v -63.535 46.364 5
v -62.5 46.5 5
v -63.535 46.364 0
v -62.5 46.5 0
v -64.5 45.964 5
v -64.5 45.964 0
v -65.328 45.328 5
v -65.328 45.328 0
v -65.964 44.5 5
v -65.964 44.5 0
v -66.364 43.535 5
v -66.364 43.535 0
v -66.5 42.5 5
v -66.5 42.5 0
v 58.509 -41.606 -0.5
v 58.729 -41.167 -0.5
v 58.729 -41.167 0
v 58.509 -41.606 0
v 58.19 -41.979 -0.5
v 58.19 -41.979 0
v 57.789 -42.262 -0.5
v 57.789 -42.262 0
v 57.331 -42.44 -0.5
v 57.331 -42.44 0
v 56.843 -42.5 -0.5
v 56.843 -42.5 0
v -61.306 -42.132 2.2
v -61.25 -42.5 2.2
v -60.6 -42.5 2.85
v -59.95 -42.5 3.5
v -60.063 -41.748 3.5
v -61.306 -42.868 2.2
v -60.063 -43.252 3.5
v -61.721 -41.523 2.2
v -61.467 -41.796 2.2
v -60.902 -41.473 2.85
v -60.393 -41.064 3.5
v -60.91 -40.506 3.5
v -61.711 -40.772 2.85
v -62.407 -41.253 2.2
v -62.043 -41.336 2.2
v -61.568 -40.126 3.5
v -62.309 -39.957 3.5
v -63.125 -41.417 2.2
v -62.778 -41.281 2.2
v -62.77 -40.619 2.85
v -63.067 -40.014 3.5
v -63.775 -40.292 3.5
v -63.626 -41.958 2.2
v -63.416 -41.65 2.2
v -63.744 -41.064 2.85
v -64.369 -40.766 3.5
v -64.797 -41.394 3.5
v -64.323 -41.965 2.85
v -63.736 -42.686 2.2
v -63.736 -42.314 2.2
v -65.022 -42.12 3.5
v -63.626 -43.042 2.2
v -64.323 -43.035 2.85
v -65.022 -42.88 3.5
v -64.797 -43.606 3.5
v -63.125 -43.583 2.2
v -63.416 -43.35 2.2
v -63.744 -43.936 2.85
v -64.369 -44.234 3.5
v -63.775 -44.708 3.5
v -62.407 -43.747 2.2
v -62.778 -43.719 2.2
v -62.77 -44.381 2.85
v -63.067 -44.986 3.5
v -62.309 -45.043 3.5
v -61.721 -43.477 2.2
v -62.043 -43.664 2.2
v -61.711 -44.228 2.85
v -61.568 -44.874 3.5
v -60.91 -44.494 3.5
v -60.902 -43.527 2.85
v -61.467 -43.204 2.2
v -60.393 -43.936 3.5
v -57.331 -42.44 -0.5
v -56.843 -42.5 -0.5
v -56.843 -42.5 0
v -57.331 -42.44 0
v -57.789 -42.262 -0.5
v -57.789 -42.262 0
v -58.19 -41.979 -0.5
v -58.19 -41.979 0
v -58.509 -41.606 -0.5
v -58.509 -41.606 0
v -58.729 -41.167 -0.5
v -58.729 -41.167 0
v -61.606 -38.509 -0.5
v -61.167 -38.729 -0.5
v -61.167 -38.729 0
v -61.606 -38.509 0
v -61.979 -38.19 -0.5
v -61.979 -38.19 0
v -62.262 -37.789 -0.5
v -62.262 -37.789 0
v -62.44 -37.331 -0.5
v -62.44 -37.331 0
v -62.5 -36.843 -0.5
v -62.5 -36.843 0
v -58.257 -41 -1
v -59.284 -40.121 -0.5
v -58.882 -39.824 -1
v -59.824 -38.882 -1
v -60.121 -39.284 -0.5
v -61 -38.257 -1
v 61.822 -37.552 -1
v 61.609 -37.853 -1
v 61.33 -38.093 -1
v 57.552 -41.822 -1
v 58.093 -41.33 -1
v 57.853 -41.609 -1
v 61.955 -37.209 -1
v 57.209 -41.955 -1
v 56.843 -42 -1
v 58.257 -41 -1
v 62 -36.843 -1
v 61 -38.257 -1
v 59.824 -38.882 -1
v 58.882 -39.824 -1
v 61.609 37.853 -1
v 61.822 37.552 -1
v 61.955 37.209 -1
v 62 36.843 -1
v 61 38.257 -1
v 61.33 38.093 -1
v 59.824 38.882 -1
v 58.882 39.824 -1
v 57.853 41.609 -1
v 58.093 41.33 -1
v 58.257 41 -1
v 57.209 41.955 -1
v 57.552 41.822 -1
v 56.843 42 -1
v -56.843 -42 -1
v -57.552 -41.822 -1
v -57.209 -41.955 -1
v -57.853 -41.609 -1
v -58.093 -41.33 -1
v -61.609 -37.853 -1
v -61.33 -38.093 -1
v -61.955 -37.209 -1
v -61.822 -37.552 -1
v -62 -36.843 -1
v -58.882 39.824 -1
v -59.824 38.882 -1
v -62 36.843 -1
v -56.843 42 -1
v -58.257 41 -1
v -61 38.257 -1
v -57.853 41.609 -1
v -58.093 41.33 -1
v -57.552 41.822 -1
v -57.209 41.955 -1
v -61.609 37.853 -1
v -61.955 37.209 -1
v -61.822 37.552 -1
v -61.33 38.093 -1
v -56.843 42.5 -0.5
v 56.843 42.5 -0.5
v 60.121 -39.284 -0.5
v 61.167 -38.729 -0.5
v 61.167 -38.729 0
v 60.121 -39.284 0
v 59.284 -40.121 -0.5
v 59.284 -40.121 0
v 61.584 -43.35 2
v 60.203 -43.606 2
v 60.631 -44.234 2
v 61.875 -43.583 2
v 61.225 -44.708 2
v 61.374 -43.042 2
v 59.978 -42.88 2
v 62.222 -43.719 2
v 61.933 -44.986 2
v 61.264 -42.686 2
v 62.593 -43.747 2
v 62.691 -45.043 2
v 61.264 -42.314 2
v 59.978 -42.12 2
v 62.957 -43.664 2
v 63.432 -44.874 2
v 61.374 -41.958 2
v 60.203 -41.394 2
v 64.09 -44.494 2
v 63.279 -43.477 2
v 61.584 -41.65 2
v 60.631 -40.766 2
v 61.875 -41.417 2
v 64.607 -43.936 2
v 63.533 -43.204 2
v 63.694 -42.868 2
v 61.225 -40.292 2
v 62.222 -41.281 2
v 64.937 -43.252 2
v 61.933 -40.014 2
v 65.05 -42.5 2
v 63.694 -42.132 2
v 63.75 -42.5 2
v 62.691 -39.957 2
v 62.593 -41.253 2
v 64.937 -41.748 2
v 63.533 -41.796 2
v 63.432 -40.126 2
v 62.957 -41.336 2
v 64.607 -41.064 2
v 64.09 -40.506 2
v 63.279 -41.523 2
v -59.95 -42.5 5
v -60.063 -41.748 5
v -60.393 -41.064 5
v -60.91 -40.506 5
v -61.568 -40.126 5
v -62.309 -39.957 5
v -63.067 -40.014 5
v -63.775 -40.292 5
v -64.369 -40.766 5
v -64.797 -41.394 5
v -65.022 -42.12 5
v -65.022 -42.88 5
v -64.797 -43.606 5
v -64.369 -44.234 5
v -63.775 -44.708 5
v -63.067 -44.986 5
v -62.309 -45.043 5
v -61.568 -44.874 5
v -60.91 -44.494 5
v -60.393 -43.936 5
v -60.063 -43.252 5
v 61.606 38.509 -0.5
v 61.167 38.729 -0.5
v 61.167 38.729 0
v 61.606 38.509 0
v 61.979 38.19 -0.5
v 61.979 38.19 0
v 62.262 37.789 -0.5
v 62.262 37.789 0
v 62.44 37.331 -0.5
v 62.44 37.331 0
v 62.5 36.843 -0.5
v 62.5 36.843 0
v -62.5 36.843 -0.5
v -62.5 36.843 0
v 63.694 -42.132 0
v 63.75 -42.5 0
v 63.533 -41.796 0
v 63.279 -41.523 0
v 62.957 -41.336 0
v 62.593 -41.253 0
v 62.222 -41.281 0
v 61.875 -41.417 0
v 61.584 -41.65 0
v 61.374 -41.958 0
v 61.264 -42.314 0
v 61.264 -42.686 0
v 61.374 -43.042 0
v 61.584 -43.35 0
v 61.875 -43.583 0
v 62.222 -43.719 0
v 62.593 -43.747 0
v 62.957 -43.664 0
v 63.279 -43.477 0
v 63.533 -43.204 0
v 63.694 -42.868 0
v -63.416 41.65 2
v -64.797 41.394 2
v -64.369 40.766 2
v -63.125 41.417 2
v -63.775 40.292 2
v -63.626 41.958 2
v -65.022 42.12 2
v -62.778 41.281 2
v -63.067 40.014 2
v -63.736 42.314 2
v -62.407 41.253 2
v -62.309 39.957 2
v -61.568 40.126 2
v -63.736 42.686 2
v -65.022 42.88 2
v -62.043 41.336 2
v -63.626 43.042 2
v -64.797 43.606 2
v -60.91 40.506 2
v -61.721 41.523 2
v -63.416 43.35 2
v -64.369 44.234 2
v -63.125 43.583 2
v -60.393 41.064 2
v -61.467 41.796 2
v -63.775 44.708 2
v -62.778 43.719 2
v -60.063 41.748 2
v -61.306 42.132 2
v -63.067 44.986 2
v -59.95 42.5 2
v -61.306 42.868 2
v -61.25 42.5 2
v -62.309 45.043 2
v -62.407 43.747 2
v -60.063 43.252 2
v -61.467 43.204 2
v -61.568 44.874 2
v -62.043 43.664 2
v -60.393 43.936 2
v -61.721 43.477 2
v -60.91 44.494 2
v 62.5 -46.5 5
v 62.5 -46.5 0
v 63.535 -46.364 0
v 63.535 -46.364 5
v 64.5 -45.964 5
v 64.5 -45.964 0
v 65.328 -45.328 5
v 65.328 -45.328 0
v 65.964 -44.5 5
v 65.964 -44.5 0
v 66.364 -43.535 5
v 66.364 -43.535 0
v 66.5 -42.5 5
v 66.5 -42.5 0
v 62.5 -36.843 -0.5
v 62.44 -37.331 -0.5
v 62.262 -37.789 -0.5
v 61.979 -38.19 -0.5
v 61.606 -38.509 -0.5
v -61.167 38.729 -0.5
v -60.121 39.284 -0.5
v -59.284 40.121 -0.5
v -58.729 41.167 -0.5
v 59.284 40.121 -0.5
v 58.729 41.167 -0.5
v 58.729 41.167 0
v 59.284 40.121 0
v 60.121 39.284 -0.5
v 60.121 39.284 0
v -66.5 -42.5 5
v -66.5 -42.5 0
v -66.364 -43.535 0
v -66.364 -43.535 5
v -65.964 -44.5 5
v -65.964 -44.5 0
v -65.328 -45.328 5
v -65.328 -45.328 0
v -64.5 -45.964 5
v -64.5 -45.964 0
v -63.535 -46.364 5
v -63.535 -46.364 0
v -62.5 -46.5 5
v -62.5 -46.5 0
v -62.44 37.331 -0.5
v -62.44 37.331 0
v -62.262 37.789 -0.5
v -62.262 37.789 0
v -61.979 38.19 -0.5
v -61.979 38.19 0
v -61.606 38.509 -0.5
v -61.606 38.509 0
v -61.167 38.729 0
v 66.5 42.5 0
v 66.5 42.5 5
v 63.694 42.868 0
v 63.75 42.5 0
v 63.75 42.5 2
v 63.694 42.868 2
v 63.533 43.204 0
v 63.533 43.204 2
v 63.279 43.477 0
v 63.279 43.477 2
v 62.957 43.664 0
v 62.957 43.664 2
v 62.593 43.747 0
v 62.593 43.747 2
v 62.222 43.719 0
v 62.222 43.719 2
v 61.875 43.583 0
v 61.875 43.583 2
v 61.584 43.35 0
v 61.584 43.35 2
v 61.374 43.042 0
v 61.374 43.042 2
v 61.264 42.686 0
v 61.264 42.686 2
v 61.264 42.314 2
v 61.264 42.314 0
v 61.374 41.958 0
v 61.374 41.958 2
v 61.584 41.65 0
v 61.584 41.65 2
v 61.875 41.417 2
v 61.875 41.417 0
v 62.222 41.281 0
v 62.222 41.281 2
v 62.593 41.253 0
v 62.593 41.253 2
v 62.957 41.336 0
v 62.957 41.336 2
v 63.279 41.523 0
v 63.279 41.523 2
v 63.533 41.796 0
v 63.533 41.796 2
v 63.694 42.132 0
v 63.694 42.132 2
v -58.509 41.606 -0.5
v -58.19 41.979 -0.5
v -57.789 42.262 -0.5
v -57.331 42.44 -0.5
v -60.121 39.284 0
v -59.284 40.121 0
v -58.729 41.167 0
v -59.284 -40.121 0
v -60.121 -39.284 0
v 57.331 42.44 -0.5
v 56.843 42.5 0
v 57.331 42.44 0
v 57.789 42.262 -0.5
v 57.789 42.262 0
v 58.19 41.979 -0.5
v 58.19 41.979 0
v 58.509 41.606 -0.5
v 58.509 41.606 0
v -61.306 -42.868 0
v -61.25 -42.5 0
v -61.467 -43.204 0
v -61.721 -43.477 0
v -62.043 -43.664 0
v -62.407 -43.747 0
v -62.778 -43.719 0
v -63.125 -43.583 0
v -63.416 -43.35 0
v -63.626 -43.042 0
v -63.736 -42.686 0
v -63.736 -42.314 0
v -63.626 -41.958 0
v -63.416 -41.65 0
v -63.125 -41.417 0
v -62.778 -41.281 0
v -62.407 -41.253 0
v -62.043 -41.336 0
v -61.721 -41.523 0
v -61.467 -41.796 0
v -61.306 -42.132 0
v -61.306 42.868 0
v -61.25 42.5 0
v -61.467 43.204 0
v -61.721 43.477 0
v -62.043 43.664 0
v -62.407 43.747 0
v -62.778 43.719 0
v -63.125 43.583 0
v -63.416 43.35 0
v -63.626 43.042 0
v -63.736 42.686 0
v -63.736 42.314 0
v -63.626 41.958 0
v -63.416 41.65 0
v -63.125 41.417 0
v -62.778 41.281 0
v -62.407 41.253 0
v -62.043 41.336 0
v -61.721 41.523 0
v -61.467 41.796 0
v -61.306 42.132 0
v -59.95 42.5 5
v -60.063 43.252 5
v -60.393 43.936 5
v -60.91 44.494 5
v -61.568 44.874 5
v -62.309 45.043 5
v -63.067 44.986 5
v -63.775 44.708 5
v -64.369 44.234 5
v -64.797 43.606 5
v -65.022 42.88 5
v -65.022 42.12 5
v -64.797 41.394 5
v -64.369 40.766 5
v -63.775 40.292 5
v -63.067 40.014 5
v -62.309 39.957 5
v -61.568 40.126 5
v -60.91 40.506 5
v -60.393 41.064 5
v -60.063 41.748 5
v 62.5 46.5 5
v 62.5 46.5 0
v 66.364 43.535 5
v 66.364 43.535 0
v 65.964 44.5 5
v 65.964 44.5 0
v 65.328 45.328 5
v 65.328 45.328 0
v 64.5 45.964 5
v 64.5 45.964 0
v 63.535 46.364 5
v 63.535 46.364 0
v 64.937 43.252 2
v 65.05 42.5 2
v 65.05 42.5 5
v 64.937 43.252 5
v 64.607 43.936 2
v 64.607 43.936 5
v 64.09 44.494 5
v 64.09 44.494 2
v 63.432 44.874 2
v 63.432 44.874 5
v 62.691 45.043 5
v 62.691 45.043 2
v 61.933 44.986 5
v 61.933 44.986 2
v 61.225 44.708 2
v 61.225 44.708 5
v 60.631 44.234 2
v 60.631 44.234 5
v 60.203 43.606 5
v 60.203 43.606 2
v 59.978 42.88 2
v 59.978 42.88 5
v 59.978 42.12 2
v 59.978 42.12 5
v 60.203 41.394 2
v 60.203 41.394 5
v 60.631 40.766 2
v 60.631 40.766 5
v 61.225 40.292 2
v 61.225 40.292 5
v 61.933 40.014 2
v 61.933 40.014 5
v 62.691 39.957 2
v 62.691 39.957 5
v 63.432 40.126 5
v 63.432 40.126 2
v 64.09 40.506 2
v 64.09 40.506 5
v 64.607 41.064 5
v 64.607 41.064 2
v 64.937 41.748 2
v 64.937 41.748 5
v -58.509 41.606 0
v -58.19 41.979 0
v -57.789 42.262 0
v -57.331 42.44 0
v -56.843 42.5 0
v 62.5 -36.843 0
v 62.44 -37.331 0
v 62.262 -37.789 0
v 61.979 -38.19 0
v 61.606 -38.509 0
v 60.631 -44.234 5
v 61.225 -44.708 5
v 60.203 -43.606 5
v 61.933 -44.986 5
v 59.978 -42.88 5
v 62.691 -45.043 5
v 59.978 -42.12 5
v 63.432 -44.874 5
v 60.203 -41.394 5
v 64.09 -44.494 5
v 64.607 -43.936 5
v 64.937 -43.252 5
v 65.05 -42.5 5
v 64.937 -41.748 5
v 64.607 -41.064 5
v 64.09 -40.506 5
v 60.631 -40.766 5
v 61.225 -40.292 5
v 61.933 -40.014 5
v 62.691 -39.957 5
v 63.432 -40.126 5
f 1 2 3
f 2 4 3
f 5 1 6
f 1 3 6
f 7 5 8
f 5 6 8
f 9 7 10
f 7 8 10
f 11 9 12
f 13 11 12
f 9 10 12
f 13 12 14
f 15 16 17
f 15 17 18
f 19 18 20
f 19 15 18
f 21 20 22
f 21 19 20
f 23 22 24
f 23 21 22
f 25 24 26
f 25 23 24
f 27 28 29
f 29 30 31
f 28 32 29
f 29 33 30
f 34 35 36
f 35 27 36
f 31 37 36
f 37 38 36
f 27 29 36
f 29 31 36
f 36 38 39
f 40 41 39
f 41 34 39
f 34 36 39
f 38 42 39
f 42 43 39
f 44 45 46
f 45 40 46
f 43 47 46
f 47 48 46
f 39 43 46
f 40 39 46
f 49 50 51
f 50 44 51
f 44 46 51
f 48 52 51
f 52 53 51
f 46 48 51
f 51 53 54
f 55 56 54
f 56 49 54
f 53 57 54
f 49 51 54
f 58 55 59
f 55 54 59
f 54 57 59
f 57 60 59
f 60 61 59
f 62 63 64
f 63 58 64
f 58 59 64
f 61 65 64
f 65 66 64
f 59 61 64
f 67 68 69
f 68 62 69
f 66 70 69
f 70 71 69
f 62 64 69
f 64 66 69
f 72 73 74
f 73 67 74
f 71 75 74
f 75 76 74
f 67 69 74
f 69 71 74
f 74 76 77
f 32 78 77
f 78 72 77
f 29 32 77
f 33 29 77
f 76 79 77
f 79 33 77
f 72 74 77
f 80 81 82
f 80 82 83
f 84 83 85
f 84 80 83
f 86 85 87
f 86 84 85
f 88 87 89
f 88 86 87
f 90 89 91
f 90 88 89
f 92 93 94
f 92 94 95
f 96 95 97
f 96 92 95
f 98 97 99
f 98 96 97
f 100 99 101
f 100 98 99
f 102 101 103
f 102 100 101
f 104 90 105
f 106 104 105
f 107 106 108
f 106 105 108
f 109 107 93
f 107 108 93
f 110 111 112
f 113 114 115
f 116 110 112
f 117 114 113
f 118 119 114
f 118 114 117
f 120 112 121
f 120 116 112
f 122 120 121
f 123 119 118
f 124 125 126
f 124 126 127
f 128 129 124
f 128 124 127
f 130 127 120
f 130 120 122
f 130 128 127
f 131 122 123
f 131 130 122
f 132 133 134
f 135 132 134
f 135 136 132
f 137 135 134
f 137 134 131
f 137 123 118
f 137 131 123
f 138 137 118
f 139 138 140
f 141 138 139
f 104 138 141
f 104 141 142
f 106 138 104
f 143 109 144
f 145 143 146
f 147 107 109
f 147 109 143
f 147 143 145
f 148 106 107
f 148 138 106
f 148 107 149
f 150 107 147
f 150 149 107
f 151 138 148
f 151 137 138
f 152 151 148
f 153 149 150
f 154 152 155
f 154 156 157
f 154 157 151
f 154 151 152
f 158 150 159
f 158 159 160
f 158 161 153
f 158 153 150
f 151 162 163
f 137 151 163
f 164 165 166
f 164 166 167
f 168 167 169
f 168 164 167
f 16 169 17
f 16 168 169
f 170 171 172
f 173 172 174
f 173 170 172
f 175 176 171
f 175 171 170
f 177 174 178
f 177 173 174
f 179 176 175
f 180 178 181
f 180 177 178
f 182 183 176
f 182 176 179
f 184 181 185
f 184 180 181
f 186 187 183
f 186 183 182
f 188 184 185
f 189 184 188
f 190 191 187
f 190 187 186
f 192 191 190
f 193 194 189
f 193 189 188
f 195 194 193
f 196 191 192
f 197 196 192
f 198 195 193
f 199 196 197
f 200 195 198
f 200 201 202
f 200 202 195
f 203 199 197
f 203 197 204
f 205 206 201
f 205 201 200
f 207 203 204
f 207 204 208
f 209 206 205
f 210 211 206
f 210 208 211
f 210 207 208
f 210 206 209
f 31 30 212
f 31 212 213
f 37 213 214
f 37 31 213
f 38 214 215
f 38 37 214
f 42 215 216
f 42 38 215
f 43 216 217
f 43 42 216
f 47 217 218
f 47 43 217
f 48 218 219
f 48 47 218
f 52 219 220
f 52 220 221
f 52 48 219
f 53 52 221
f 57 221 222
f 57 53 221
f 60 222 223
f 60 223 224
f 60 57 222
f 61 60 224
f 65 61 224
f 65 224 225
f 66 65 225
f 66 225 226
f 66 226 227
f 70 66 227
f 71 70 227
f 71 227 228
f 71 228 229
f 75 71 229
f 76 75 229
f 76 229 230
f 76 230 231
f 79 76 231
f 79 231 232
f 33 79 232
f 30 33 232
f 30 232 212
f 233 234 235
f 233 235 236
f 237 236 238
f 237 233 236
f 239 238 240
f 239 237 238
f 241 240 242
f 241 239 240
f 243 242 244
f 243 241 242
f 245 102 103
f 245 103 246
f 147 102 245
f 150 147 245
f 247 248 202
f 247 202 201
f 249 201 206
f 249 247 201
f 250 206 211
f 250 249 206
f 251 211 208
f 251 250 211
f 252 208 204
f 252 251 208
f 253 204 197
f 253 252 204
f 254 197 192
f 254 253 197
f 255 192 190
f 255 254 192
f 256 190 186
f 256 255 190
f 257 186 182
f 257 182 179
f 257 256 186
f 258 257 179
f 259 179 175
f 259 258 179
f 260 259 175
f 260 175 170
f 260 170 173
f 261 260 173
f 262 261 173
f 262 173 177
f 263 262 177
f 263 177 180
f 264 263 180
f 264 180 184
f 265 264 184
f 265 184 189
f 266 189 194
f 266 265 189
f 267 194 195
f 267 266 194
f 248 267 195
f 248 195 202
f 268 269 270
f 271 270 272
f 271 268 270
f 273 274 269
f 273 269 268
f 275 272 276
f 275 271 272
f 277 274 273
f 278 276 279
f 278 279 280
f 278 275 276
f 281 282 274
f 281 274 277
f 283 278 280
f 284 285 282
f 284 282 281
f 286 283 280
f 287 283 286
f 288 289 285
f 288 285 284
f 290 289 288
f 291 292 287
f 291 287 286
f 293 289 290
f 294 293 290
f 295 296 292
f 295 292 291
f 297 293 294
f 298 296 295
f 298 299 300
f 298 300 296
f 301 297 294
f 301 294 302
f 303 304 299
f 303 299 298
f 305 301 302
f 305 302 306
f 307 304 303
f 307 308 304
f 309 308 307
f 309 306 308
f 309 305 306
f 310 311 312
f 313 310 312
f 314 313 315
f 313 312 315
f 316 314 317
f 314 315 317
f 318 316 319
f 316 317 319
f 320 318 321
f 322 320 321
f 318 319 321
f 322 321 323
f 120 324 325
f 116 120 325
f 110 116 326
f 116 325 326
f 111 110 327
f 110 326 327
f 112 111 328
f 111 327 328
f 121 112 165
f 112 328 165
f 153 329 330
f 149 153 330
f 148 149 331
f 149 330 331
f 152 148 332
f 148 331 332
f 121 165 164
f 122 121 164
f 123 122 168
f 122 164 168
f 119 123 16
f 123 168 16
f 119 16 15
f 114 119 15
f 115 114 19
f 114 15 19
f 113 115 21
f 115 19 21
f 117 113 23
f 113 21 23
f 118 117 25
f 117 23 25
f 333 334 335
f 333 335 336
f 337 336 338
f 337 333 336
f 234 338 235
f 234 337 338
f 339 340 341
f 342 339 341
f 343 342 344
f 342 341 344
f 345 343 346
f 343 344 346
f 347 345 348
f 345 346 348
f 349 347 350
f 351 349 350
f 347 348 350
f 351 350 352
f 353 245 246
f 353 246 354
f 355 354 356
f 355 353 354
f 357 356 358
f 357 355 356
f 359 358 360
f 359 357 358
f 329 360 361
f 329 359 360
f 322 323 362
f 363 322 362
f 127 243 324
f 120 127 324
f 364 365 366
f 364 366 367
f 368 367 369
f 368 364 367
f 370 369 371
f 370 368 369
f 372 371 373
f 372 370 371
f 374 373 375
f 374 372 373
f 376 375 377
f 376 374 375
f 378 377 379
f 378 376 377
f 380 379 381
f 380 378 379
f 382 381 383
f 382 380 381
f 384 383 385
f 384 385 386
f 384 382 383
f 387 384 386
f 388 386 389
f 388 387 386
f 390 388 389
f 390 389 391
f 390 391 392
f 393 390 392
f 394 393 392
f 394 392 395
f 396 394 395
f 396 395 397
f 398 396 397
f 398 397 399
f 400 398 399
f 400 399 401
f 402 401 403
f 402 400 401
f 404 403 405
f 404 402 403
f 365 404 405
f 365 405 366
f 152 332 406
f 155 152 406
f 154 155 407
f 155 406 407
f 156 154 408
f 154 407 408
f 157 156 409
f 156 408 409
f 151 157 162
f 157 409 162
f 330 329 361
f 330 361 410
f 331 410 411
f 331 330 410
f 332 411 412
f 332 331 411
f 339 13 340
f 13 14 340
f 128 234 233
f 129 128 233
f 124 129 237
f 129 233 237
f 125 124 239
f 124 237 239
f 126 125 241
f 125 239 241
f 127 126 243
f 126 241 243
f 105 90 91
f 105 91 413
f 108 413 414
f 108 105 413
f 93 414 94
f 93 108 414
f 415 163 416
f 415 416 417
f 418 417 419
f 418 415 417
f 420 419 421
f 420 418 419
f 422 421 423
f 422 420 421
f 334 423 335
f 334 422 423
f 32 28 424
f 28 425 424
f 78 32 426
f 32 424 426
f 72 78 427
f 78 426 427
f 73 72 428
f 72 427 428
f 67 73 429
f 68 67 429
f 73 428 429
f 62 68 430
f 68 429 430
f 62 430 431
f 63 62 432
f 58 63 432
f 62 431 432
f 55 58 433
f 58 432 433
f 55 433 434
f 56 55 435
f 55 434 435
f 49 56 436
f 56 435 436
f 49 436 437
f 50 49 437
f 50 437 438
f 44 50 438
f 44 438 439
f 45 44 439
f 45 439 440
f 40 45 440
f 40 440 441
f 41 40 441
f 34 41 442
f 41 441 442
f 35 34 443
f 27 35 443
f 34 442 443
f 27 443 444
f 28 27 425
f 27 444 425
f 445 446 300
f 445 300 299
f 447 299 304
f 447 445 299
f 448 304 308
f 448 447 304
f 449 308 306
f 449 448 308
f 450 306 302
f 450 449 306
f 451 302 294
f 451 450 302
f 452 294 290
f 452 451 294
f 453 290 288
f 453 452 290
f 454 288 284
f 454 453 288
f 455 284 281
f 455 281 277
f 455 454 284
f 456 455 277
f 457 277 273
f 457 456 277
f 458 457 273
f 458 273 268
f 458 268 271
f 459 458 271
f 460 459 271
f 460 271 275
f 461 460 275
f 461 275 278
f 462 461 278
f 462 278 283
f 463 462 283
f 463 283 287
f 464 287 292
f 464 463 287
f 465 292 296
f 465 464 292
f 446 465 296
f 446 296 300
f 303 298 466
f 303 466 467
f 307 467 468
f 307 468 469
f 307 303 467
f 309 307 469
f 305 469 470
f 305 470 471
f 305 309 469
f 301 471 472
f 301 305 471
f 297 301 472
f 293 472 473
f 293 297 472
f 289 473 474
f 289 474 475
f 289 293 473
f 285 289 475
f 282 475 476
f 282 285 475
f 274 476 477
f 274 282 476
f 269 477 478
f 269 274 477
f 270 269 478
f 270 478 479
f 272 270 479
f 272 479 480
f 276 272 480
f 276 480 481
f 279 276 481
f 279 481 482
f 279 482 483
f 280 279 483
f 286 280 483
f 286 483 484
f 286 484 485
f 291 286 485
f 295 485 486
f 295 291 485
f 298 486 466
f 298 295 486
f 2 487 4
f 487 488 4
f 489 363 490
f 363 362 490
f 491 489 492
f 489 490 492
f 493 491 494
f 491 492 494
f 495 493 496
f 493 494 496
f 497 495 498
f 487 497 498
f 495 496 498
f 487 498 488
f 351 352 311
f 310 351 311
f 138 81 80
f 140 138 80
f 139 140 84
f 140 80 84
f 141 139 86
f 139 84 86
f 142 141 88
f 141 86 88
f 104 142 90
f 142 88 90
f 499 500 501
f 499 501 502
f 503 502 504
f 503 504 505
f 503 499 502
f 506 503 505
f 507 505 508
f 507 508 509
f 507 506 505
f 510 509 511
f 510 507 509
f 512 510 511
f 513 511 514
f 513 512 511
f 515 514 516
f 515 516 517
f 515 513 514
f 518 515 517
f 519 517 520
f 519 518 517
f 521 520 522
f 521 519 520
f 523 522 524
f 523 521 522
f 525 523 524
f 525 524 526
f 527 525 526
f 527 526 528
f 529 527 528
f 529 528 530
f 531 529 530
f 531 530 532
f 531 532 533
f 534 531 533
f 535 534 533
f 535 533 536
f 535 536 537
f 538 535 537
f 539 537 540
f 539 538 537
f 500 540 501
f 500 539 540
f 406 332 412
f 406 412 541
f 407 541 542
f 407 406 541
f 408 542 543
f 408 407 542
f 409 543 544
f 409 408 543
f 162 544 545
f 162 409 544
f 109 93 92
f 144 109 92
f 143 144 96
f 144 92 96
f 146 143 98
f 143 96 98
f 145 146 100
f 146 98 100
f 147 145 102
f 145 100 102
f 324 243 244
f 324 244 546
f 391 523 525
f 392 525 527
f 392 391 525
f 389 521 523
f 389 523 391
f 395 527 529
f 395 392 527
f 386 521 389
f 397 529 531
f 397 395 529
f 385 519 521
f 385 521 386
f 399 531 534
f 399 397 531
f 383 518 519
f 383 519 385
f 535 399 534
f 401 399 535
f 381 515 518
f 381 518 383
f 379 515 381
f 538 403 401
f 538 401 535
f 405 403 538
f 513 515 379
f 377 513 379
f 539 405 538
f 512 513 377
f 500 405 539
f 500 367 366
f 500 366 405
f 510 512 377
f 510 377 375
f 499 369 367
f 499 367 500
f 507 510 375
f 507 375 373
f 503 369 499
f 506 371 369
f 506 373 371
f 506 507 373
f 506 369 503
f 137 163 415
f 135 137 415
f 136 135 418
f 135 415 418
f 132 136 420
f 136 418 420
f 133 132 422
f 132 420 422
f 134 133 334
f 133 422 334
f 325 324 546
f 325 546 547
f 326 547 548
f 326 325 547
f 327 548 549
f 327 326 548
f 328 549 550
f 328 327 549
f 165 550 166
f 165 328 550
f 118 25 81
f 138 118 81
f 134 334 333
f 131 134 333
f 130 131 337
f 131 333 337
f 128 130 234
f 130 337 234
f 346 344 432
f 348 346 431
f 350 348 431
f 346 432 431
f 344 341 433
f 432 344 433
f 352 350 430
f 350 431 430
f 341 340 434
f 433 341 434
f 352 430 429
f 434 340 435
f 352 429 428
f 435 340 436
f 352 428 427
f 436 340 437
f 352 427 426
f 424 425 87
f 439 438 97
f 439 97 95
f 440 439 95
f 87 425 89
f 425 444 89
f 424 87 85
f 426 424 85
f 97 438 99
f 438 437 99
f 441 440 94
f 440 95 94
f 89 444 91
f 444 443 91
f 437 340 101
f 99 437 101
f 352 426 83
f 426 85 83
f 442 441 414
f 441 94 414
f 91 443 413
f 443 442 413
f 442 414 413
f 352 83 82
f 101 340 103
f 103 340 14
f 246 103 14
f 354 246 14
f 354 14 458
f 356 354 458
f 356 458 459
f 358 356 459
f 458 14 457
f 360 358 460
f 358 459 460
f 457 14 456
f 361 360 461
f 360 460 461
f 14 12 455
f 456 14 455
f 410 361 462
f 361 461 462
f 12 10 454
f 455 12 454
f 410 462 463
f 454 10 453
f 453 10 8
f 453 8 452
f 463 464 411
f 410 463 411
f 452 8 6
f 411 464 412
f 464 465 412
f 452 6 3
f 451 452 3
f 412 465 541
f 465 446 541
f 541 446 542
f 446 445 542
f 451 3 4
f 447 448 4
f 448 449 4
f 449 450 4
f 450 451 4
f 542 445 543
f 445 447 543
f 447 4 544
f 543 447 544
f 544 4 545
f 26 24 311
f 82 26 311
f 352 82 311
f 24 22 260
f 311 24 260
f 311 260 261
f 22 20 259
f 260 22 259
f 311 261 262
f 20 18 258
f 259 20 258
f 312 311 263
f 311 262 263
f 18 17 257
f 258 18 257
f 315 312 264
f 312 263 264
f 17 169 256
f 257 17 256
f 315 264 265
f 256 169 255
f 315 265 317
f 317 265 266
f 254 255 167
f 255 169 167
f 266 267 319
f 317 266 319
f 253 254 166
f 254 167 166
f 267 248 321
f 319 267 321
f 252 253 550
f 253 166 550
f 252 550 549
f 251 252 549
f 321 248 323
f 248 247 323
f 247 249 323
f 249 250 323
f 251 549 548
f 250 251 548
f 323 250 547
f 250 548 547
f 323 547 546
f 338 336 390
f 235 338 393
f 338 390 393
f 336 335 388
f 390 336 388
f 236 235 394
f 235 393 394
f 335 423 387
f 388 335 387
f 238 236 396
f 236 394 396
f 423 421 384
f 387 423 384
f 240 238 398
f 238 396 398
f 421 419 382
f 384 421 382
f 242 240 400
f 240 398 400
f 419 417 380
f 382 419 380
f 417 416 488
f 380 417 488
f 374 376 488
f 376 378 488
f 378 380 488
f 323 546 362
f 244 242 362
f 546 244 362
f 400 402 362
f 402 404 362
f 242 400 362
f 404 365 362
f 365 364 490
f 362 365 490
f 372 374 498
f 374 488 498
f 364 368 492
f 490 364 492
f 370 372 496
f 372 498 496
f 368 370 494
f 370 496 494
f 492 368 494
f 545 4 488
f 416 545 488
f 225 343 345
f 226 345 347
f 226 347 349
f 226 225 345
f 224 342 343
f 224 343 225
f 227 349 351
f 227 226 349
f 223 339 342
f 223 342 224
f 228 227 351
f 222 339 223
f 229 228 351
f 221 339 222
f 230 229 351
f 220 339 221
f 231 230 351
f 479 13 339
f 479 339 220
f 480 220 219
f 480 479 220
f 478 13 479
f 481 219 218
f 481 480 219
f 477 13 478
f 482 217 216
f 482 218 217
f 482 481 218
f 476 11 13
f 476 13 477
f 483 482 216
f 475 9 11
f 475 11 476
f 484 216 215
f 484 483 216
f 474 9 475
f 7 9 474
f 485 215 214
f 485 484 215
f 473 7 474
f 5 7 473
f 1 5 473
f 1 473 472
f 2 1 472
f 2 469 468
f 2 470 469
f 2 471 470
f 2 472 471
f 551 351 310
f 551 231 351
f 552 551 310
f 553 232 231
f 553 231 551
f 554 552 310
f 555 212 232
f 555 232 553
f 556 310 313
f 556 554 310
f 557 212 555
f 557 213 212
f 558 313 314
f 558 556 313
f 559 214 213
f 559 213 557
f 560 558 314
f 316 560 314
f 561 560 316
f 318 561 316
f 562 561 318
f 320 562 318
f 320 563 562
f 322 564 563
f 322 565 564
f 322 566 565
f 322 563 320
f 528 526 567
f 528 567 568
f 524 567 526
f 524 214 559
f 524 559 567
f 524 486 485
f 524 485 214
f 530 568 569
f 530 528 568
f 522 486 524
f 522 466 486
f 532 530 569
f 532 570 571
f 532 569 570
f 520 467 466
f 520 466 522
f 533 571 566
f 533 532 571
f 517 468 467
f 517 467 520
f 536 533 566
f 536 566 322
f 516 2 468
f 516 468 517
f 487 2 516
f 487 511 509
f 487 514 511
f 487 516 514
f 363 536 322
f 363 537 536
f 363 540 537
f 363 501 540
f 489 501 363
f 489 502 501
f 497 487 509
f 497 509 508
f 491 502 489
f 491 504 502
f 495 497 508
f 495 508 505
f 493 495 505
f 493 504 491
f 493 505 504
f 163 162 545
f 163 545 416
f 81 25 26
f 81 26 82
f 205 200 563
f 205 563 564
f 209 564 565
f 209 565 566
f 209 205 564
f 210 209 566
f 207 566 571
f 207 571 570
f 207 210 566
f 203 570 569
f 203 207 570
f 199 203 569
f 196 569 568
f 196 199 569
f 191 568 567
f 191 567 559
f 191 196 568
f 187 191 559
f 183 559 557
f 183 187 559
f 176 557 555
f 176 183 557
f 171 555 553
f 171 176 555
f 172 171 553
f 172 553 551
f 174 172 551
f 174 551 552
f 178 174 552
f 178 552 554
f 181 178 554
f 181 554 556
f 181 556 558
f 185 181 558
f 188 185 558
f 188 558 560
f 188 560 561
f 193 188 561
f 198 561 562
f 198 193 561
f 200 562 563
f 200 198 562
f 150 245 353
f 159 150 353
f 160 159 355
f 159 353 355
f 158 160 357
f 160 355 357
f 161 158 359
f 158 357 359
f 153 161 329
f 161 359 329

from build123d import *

# Parameters (mm, degrees)
SKETCH2_R           = 1.25
BOSS_EXTRUDE1_DEPTH = 2
SKETCH3_R           = 2.55
BOSS_EXTRUDE2_DEPTH = 3
BOSS_EXTRUDE3_START = 3
BOSS_EXTRUDE3_DEPTH = 3
CHAMFER1_SIZE       = 0.5
CHAMFER2_SIZE       = 1.5


with BuildPart() as part:
    # Sketch2 → Boss-Extrude1 (new body)
    with BuildSketch(Plane.XY):
        with BuildLine():
            Line((66.5, -42.5), (66.5, 42.5))
            ThreePointArc((66.5, 42.5), (65.328427125, 45.328427125), (62.5, 46.5))
            Line((62.5, 46.5), (-62.5, 46.5))
            ThreePointArc((-62.5, 46.5), (-65.328427125, 45.328427125), (-66.5, 42.5))
            Line((-66.5, 42.5), (-66.5, -42.5))
            ThreePointArc((-66.5, -42.5), (-65.328427125, -45.328427125), (-62.5, -46.5))
            Line((-62.5, -46.5), (62.5, -46.5))
            ThreePointArc((62.5, -46.5), (65.328427125, -45.328427125), (66.5, -42.5))
        make_face()
        with Locations((-62.5, 42.5)):
            Circle(SKETCH2_R, mode=Mode.SUBTRACT)
        with Locations((62.5, 42.5)):
            Circle(SKETCH2_R, mode=Mode.SUBTRACT)
        with Locations((-62.5, -42.5)):
            Circle(SKETCH2_R, mode=Mode.SUBTRACT)
        with Locations((62.5, -42.5)):
            Circle(SKETCH2_R, mode=Mode.SUBTRACT)
        with BuildLine():
            Line((-62.5, -36.843145751), (-62.5, 36.843145751))
            ThreePointArc((-62.5, 36.843145751), (-62.132993162, 37.997846289), (-61.166666667, 38.728763834))
            ThreePointArc((-61.166666667, 38.728763834), (-59.671572875, 39.671572875), (-58.728763834, 41.166666667))
            ThreePointArc((-58.728763834, 41.166666667), (-57.997846289, 42.132993162), (-56.843145751, 42.5))
            Line((-56.843145751, 42.5), (56.843145751, 42.5))
            ThreePointArc((56.843145751, 42.5), (57.997846289, 42.132993162), (58.728763834, 41.166666667))
            ThreePointArc((58.728763834, 41.166666667), (59.671572875, 39.671572875), (61.166666667, 38.728763834))
            ThreePointArc((61.166666667, 38.728763834), (62.132993162, 37.997846289), (62.5, 36.843145751))
            Line((62.5, 36.843145751), (62.5, -36.843145751))
            ThreePointArc((62.5, -36.843145751), (62.132993162, -37.997846289), (61.166666667, -38.728763834))
            ThreePointArc((61.166666667, -38.728763834), (59.671572875, -39.671572875), (58.728763834, -41.166666667))
            ThreePointArc((58.728763834, -41.166666667), (57.997846289, -42.132993162), (56.843145751, -42.5))
            Line((56.843145751, -42.5), (-56.843145751, -42.5))
            ThreePointArc((-56.843145751, -42.5), (-57.997846289, -42.132993162), (-58.728763834, -41.166666667))
            ThreePointArc((-58.728763834, -41.166666667), (-59.671572875, -39.671572875), (-61.166666667, -38.728763834))
            ThreePointArc((-61.166666667, -38.728763834), (-62.132993162, -37.997846289), (-62.5, -36.843145751))
        make_face(mode=Mode.SUBTRACT)
    extrude(amount=BOSS_EXTRUDE1_DEPTH)

    # Sketch3 → Boss-Extrude2 (add)
    with BuildSketch(Plane.XY.offset(2)):
        with BuildLine():
            Line((66.5, -42.5), (66.5, 42.5))
            ThreePointArc((66.5, 42.5), (65.328427125, 45.328427125), (62.5, 46.5))
            Line((62.5, 46.5), (-62.5, 46.5))
            ThreePointArc((-62.5, 46.5), (-65.328427125, 45.328427125), (-66.5, 42.5))
            Line((-66.5, 42.5), (-66.5, -42.5))
            ThreePointArc((-66.5, -42.5), (-65.328427125, -45.328427125), (-62.5, -46.5))
            Line((-62.5, -46.5), (62.5, -46.5))
            ThreePointArc((62.5, -46.5), (65.328427125, -45.328427125), (66.5, -42.5))
        make_face()
        with Locations((-62.5, 42.5)):
            Circle(SKETCH3_R, mode=Mode.SUBTRACT)
        with Locations((62.5, 42.5)):
            Circle(SKETCH3_R, mode=Mode.SUBTRACT)
        with Locations((62.5, -42.5)):
            Circle(SKETCH3_R, mode=Mode.SUBTRACT)
        with Locations((-62.5, -42.5)):
            Circle(SKETCH3_R, mode=Mode.SUBTRACT)
    extrude(amount=BOSS_EXTRUDE2_DEPTH)

    # Sketch4 → Boss-Extrude3 (add)
    with BuildSketch(Plane(origin=(0, 0, 2), x_dir=(-1, 0, 0), z_dir=(0, 0, -1)).offset(BOSS_EXTRUDE3_START)):
        with BuildLine():
            Line((62.5, -36.843145751), (62.5, 36.843145751))
            ThreePointArc((62.5, 36.843145751), (62.132993162, 37.997846289), (61.166666667, 38.728763834))
            ThreePointArc((61.166666667, 38.728763834), (59.671572875, 39.671572875), (58.728763834, 41.166666667))
            ThreePointArc((58.728763834, 41.166666667), (57.997846289, 42.132993162), (56.843145751, 42.5))
            Line((56.843145751, 42.5), (-56.843145751, 42.5))
            ThreePointArc((-56.843145751, 42.5), (-57.997846289, 42.132993162), (-58.728763834, 41.166666667))
            ThreePointArc((-58.728763834, 41.166666667), (-59.671572875, 39.671572875), (-61.166666667, 38.728763834))
            ThreePointArc((-61.166666667, 38.728763834), (-62.132993162, 37.997846289), (-62.5, 36.843145751))
            Line((-62.5, 36.843145751), (-62.5, -36.843145751))
            ThreePointArc((-62.5, -36.843145751), (-62.132993162, -37.997846289), (-61.166666667, -38.728763834))
            ThreePointArc((-61.166666667, -38.728763834), (-59.671572875, -39.671572875), (-58.728763834, -41.166666667))
            ThreePointArc((-58.728763834, -41.166666667), (-57.997846289, -42.132993162), (-56.843145751, -42.5))
            Line((-56.843145751, -42.5), (56.843145751, -42.5))
            ThreePointArc((56.843145751, -42.5), (57.997846289, -42.132993162), (58.728763834, -41.166666667))
            ThreePointArc((58.728763834, -41.166666667), (59.671572875, -39.671572875), (61.166666667, -38.728763834))
            ThreePointArc((61.166666667, -38.728763834), (62.132993162, -37.997846289), (62.5, -36.843145751))
        make_face()
    extrude(amount=-BOSS_EXTRUDE3_DEPTH)

    # Chamfer1
    chamfer1_edges = [part.edges().sort_by_distance(p)[0] for p in [
        (-59.671572875, -39.671572875, -1),
        (-62.132993162, -37.997846289, -1),
        (-62.5, 0, -1),
        (-62.132993162, 37.997846289, -1),
        (-59.671572875, 39.671572875, -1),
        (-57.997846289, 42.132993162, -1),
        (0, 42.5, -1),
        (57.997846289, 42.132993162, -1),
        (59.671572875, 39.671572875, -1),
        (62.132993162, 37.997846289, -1),
        (62.5, 0, -1),
        (62.132993162, -37.997846289, -1),
        (59.671572875, -39.671572875, -1),
        (57.997846289, -42.132993162, -1),
        (0, -42.5, -1),
        (-57.997846289, -42.132993162, -1),
    ]]
    chamfer(chamfer1_edges, length=CHAMFER1_SIZE)

    # Chamfer2
    # the kernel refuses this chamfer: 1.5 mm, written as the material it adds along each edge
    with BuildSketch(Plane(origin=(-62.5, -42.5, 2), x_dir=(1, 0, 0), z_dir=(0, -1, 0))) as chamfer2_piece_1_section:
        Polygon((2.55 - CHAMFER2_SIZE, 0), (2.55, CHAMFER2_SIZE), (2.55, 0), align=None)
    chamfer2_piece_1 = revolve(axis=Axis((-62.5, -42.5, 2), (0, 0, 1)), mode=Mode.PRIVATE)
    chamfer2_piece_1 = chamfer2_piece_1 - Plane(origin=(-62.5, -42.5, 2.85349357), x_dir=(1, 0, 0), z_dir=(0, 0, -1)) * Cylinder(1.25, 11, mode=Mode.PRIVATE)
    add(chamfer2_piece_1)


solid = part.part
